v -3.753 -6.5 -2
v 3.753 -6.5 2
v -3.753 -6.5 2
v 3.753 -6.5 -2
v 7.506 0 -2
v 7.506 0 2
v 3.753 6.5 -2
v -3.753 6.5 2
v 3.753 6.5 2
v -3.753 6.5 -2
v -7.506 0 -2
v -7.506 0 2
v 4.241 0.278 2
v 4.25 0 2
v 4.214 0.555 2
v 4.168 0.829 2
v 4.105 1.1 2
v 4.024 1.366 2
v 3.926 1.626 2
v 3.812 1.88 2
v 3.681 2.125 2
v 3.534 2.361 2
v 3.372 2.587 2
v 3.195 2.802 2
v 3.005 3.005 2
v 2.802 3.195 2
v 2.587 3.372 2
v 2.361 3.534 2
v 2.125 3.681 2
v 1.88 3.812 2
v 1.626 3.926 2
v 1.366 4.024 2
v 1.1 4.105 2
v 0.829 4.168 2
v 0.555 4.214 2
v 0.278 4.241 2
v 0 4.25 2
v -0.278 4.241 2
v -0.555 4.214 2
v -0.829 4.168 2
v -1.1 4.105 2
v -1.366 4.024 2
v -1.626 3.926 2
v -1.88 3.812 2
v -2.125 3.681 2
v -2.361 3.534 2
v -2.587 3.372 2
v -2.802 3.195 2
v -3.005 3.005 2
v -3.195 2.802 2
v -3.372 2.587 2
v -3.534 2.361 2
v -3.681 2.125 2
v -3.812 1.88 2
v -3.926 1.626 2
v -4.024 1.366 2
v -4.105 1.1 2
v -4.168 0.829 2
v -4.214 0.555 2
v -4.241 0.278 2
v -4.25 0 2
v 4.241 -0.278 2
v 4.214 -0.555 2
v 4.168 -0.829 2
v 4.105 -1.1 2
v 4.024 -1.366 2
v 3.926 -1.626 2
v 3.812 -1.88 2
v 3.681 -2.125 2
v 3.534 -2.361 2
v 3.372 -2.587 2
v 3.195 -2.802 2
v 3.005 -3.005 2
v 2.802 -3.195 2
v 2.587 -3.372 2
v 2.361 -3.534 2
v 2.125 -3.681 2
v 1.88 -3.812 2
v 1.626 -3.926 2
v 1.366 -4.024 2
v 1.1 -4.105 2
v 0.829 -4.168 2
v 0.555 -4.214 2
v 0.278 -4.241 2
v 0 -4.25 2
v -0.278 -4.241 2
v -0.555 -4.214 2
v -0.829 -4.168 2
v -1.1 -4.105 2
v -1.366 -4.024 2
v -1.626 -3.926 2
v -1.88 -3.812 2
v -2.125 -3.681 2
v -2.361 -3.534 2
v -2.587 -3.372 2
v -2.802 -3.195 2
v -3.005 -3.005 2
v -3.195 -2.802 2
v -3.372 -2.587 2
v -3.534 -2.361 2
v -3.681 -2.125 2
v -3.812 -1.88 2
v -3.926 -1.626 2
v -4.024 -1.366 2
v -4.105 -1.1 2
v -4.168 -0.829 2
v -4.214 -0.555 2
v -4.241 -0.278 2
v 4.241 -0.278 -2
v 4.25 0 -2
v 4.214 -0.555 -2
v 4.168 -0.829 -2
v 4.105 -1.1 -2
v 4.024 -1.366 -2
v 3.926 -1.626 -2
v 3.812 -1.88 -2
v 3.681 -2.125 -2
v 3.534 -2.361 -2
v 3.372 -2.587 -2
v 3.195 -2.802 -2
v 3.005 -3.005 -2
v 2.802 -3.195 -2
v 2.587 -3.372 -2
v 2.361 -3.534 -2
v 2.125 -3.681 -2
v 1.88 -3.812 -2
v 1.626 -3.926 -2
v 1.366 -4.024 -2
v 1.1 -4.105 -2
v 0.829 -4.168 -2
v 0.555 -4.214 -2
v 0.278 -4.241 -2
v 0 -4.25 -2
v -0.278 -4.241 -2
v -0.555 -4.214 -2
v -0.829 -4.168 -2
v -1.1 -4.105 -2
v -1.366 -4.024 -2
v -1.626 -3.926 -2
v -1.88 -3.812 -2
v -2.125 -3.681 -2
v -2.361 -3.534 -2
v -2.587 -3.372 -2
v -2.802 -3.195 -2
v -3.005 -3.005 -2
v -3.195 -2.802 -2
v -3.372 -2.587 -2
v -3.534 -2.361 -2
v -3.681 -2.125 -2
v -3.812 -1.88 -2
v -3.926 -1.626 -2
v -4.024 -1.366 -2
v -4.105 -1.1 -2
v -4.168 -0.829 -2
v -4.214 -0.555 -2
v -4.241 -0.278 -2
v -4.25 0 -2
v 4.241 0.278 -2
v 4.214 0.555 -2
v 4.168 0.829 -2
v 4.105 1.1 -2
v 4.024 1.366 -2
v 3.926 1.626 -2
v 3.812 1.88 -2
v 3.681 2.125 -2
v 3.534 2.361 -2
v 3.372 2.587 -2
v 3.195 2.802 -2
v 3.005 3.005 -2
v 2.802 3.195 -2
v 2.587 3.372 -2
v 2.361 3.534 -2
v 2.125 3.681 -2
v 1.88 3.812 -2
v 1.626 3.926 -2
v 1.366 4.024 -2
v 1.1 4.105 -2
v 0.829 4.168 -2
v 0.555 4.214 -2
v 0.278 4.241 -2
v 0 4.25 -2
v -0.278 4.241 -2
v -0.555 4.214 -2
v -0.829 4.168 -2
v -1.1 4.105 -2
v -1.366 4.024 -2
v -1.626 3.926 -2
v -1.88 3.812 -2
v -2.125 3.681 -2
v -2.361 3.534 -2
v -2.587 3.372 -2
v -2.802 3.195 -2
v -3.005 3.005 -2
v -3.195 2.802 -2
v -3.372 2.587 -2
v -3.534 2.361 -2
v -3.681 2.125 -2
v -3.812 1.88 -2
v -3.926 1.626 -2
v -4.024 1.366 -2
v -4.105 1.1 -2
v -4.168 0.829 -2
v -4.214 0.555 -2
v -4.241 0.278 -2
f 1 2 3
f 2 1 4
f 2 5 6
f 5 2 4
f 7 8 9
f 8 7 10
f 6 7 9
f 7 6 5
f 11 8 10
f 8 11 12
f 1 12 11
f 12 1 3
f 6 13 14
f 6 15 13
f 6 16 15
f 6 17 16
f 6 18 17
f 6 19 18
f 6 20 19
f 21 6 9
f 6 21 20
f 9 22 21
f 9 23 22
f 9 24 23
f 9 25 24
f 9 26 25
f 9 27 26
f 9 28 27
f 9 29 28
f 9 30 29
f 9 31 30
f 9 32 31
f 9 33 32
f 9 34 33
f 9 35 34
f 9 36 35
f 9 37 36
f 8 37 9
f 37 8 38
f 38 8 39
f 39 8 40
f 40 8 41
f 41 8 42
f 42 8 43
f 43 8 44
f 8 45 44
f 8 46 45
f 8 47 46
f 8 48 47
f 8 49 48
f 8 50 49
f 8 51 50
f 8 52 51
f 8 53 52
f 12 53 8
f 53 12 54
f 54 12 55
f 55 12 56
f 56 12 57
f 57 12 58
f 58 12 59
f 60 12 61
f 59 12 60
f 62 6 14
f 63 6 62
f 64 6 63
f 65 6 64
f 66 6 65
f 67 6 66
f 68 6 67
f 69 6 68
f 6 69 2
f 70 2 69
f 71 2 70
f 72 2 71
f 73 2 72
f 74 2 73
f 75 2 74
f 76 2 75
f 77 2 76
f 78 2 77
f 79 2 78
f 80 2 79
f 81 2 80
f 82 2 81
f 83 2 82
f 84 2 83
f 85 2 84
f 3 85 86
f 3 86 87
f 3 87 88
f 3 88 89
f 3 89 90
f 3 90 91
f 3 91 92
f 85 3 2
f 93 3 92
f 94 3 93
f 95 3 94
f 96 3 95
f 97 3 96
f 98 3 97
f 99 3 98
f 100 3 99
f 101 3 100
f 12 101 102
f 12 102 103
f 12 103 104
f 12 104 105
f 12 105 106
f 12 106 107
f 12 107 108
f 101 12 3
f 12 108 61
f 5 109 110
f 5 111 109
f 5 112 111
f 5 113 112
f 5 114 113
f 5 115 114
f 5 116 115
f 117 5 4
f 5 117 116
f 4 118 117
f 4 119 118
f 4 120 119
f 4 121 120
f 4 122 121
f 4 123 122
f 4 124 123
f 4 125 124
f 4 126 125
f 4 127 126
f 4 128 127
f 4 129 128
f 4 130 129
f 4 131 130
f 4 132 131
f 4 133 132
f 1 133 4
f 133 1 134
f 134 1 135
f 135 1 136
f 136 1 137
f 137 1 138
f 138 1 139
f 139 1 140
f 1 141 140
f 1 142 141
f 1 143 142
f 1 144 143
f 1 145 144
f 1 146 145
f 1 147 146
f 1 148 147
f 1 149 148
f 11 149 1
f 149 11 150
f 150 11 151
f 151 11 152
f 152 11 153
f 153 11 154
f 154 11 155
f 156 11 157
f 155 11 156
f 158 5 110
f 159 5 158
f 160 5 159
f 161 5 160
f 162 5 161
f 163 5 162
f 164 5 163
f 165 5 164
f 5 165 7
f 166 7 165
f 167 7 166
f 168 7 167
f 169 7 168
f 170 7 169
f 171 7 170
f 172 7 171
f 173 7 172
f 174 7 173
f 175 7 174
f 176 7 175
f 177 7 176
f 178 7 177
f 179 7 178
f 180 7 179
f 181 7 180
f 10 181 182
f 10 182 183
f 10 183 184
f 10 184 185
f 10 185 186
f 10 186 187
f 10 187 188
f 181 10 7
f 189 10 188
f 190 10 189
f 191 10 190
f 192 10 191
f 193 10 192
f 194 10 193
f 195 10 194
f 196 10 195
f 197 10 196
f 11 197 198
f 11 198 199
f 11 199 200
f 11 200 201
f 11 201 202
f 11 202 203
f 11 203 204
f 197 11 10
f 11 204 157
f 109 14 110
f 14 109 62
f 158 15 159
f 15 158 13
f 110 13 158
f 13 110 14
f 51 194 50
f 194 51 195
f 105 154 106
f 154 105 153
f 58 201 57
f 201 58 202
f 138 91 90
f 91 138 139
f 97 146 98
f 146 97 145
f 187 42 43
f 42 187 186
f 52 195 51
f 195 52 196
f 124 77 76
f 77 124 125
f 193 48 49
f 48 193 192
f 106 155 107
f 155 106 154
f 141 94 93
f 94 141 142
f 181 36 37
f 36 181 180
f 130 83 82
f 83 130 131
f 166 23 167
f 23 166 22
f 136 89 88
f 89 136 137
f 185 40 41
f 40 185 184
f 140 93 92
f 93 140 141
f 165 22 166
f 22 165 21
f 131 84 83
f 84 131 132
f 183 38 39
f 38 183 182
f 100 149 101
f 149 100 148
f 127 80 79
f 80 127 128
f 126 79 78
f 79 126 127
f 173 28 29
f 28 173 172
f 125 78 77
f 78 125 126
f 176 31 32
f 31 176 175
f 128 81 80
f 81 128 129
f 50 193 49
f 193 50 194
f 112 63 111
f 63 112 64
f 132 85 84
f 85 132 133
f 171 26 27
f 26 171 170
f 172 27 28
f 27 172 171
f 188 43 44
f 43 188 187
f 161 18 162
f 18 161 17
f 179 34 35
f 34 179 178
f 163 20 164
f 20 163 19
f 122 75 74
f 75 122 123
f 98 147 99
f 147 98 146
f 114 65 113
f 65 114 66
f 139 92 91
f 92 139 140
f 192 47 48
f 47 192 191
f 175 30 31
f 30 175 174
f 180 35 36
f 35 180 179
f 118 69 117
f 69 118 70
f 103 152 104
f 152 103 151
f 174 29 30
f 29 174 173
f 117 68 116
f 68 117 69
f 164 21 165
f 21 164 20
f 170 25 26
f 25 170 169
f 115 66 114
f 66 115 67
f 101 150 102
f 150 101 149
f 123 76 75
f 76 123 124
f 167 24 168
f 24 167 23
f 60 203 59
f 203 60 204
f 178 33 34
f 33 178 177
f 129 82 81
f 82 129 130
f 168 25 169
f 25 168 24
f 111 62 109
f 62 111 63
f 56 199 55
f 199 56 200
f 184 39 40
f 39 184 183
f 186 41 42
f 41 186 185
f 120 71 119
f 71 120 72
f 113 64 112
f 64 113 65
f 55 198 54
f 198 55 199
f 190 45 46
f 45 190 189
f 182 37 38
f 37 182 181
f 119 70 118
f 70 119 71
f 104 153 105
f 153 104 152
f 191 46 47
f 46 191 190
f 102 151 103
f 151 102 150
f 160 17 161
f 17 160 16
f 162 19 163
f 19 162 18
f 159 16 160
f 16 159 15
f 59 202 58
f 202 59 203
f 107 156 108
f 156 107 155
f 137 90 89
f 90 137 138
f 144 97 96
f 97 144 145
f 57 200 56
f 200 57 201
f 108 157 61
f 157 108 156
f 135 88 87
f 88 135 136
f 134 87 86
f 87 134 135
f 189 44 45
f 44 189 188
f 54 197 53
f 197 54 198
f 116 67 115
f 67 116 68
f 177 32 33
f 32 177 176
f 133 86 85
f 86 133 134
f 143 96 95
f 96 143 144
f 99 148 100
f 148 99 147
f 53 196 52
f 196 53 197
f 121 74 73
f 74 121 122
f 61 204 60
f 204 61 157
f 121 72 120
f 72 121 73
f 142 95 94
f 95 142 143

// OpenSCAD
$fn = 96;

module hex_prism_af(af=13.0, h=4.0, center=true) {
    // Regular hex: across-flats (AF) = 2 * apothem
    // For a hex made as a 6-sided cylinder, apothem = R * cos(30)
    // => R = AF / (2*cos(30))
    R = af / (2 * cos(30));
    cylinder(h=h, r=R, $fn=6, center=center);
}

module hex_nut(af=13.0, thickness=4.0, screw_d=8.0, clearance=0.5) {
    hole_d = screw_d + clearance;
    eps = 0.02;

    difference() {
        hex_prism_af(af=af, h=thickness, center=true);
        cylinder(d=hole_d, h=thickness + 2*eps, center=true);
    }
}

hex_nut(af=13.0, thickness=4.0, screw_d=8.0, clearance=0.5);
